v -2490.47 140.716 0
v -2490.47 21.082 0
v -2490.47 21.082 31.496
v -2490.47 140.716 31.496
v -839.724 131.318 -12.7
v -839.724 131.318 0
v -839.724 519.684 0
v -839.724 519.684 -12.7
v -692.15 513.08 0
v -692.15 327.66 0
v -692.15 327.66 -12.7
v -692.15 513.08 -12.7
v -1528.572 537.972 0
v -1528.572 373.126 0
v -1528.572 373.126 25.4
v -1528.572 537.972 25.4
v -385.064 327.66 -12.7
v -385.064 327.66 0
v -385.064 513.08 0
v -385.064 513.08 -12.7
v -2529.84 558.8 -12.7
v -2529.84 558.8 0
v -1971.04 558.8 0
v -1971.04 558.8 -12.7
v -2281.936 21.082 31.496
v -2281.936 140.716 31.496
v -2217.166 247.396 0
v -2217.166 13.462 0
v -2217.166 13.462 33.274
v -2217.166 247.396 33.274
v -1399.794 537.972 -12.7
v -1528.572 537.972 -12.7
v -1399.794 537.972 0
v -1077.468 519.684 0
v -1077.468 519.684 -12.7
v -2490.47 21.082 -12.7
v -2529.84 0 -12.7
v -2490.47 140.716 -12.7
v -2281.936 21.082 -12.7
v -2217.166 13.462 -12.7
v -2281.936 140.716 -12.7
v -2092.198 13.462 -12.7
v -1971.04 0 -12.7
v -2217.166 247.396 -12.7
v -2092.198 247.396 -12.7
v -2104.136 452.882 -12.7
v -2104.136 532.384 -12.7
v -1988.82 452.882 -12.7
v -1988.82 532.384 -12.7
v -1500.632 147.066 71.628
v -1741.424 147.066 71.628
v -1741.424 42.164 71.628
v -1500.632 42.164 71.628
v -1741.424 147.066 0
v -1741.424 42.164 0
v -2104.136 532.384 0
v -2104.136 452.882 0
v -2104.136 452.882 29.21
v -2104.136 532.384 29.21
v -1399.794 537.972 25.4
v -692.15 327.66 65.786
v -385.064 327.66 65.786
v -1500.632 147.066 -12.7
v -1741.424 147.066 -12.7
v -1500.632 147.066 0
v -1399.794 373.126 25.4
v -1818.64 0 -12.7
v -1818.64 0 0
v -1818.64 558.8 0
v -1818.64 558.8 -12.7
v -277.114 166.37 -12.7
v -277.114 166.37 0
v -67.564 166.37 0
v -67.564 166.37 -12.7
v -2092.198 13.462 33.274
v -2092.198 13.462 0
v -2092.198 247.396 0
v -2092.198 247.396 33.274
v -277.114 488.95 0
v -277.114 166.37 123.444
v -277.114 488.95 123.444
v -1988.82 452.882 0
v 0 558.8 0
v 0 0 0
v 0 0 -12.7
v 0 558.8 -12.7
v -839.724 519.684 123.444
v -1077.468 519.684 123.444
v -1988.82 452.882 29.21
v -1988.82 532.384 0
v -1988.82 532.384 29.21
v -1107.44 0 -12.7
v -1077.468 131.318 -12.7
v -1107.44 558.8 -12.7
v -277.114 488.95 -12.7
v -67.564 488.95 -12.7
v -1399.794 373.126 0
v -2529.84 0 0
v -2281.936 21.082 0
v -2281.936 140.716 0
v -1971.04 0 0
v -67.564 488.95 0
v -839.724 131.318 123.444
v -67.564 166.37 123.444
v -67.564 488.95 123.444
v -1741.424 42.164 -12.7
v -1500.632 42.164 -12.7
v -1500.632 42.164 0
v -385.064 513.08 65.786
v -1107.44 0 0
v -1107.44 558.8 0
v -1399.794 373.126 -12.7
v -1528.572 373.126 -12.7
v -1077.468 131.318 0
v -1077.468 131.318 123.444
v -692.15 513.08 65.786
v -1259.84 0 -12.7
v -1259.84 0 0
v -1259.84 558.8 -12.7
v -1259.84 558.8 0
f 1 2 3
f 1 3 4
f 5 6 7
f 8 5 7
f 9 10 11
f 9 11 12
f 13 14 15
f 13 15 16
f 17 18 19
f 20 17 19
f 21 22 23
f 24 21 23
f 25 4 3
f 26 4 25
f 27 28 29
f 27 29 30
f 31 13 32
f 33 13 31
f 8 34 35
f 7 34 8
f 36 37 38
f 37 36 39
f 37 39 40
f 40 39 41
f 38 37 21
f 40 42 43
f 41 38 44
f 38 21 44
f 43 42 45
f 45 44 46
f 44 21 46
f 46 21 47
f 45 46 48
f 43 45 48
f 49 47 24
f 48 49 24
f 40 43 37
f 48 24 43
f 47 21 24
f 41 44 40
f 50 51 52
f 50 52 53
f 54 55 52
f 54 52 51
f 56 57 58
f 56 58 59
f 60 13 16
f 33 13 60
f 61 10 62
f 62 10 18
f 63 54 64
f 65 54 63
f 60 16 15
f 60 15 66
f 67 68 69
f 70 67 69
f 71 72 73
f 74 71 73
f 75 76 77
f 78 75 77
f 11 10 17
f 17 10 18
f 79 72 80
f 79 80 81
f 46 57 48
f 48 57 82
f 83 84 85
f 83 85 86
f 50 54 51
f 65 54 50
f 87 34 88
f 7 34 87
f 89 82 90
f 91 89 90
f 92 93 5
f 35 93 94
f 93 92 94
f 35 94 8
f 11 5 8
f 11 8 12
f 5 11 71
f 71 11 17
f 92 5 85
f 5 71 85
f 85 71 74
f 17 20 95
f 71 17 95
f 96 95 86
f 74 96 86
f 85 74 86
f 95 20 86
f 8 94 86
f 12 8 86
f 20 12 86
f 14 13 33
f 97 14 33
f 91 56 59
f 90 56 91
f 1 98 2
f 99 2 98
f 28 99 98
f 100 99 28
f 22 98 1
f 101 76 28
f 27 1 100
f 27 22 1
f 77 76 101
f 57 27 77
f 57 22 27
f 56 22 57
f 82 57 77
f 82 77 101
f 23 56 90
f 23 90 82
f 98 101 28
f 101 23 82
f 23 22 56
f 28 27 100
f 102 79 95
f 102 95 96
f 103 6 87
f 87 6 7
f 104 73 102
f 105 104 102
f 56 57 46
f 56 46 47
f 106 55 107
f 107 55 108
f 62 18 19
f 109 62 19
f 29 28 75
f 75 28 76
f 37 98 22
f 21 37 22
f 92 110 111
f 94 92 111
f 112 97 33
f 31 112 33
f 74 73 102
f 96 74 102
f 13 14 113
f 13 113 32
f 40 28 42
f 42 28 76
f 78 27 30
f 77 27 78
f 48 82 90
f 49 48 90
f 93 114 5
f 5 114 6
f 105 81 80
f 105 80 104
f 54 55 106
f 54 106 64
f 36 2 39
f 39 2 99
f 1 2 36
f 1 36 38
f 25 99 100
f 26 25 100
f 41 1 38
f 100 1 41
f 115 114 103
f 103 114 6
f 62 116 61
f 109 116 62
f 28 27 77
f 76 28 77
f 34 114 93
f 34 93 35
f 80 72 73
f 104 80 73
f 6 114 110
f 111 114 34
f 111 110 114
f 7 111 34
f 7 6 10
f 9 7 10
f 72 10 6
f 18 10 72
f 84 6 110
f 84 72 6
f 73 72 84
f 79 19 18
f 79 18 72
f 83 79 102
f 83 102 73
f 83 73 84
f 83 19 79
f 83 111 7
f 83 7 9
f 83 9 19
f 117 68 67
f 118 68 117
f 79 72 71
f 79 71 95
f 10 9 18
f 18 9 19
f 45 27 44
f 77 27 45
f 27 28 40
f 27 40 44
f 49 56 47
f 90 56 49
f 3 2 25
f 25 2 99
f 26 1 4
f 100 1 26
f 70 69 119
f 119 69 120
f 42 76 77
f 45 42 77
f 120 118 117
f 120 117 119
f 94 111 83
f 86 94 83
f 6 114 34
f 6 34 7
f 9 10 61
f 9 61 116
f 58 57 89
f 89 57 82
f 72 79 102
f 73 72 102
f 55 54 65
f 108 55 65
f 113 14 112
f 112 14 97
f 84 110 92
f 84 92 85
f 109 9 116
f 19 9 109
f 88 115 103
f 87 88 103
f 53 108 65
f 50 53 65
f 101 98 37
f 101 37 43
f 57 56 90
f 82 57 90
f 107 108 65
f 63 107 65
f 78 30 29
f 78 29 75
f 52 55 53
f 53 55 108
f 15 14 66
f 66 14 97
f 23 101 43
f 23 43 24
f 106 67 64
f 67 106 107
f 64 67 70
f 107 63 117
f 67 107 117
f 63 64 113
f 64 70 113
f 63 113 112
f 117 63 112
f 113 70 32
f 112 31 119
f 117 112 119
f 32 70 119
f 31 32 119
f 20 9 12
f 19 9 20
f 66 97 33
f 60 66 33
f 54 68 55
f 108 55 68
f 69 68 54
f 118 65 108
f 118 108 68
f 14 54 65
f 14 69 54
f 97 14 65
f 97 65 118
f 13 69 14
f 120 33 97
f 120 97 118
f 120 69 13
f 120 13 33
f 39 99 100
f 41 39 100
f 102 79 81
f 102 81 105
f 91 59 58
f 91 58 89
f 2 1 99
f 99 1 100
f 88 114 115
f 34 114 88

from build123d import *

# Parameters (mm, degrees)
F0_W      = 1107.44
F0_H      = 558.8
F0_W_2    = 237.744
F0_H_2    = 388.366
F0_W_3    = 307.086
F0_H_3    = 185.42
F0_W_4    = 209.55
F0_H_4    = 322.58
F1_DEPTH  = 12.7
F2_DEPTH  = 123.444
F3_DEPTH  = 123.444
F4_DEPTH  = 65.786
F5_W      = 558.8
F5_H      = 558.8
F5_W_2    = 240.792
F5_H_2    = 104.902
F5_W_3    = 128.778
F5_H_3    = 164.846
F6_DEPTH  = 12.7
F7_DEPTH  = 25.4
F8_DEPTH  = 71.628
F9_W      = 558.8
F9_H      = 558.8
F9_W_2    = 208.534
F9_H_2    = 119.634
F9_W_3    = 124.968
F9_H_3    = 233.934
F9_W_4    = 115.316
F9_H_4    = 79.502
F10_DEPTH = 12.7
F11_DEPTH = 31.496
F12_DEPTH = 33.274
F13_DEPTH = 29.21


with BuildPart() as f1:
    # F0 (on Top) → F1 (new body)
    with BuildSketch(Plane.XY):
        with Locations((-553.72, 279.4)):
            Rectangle(F0_W, F0_H)
        with Locations((-958.596, 325.501)):
            Rectangle(F0_W_2, F0_H_2, mode=Mode.SUBTRACT)
        with Locations((-538.607, 420.37)):
            Rectangle(F0_W_3, F0_H_3, mode=Mode.SUBTRACT)
        with Locations((-172.339, 327.66)):
            Rectangle(F0_W_4, F0_H_4, mode=Mode.SUBTRACT)
    extrude(amount=-F1_DEPTH)

    # F0 (on Top) → F2 (join)
    with BuildSketch(Plane.XY):
        with Locations((-958.596, 325.501)):
            Rectangle(F0_W_2, F0_H_2)
    extrude(amount=F2_DEPTH)


with BuildPart() as f3:
    # F0 (on Top) → F3 (new body)
    with BuildSketch(Plane.XY):
        with Locations((-172.339, 327.66)):
            Rectangle(F0_W_4, F0_H_4)
    extrude(amount=F3_DEPTH)


with BuildPart() as f4:
    # F0 (on Top) → F4 (new body)
    with BuildSketch(Plane.XY):
        with Locations((-538.607, 420.37)):
            Rectangle(F0_W_3, F0_H_3)
    extrude(amount=F4_DEPTH)


with BuildPart() as f6:
    # F5 (on Top) → F6 (new body)
    with BuildSketch(Plane.XY):
        with Locations((-1539.24, 279.4)):
            Rectangle(F5_W, F5_H)
        with Locations((-1621.028, 94.615)):
            Rectangle(F5_W_2, F5_H_2, mode=Mode.SUBTRACT)
        with Locations((-1464.183, 455.549)):
            Rectangle(F5_W_3, F5_H_3, mode=Mode.SUBTRACT)
    extrude(amount=-F6_DEPTH)


with BuildPart() as f7:
    # F5 (on Top) → F7 (new body)
    with BuildSketch(Plane.XY):
        with Locations((-1464.183, 455.549)):
            Rectangle(F5_W_3, F5_H_3)
    extrude(amount=F7_DEPTH)


with BuildPart() as f8:
    # F5 (on Top) → F8 (new body)
    with BuildSketch(Plane.XY):
        with Locations((-1621.028, 94.615)):
            Rectangle(F5_W_2, F5_H_2)
    extrude(amount=F8_DEPTH)


with BuildPart() as f10:
    # F9 (on Top) → F10 (new body)
    with BuildSketch(Plane.XY):
        with Locations((-2250.44, 279.4)):
            Rectangle(F9_W, F9_H)
        with Locations((-2386.203, 80.899)):
            Rectangle(F9_W_2, F9_H_2, mode=Mode.SUBTRACT)
        with Locations((-2154.682, 130.429)):
            Rectangle(F9_W_3, F9_H_3, mode=Mode.SUBTRACT)
        with Locations((-2046.478, 492.633)):
            Rectangle(F9_W_4, F9_H_4, mode=Mode.SUBTRACT)
    extrude(amount=-F10_DEPTH)


with BuildPart() as f11:
    # F9 (on Top) → F11 (new body)
    with BuildSketch(Plane.XY):
        with Locations((-2386.203, 80.899)):
            Rectangle(F9_W_2, F9_H_2)
    extrude(amount=F11_DEPTH)


with BuildPart() as f12:
    # F9 (on Top) → F12 (new body)
    with BuildSketch(Plane.XY):
        with Locations((-2154.682, 130.429)):
            Rectangle(F9_W_3, F9_H_3)
    extrude(amount=F12_DEPTH)


with BuildPart() as f13:
    # F9 (on Top) → F13 (new body)
    with BuildSketch(Plane.XY):
        with Locations((-2046.478, 492.633)):
            Rectangle(F9_W_4, F9_H_4)
    extrude(amount=F13_DEPTH)


solid = Compound([f1.part, f3.part, f4.part, f6.part, f7.part, f8.part, f10.part, f11.part, f12.part, f13.part])
